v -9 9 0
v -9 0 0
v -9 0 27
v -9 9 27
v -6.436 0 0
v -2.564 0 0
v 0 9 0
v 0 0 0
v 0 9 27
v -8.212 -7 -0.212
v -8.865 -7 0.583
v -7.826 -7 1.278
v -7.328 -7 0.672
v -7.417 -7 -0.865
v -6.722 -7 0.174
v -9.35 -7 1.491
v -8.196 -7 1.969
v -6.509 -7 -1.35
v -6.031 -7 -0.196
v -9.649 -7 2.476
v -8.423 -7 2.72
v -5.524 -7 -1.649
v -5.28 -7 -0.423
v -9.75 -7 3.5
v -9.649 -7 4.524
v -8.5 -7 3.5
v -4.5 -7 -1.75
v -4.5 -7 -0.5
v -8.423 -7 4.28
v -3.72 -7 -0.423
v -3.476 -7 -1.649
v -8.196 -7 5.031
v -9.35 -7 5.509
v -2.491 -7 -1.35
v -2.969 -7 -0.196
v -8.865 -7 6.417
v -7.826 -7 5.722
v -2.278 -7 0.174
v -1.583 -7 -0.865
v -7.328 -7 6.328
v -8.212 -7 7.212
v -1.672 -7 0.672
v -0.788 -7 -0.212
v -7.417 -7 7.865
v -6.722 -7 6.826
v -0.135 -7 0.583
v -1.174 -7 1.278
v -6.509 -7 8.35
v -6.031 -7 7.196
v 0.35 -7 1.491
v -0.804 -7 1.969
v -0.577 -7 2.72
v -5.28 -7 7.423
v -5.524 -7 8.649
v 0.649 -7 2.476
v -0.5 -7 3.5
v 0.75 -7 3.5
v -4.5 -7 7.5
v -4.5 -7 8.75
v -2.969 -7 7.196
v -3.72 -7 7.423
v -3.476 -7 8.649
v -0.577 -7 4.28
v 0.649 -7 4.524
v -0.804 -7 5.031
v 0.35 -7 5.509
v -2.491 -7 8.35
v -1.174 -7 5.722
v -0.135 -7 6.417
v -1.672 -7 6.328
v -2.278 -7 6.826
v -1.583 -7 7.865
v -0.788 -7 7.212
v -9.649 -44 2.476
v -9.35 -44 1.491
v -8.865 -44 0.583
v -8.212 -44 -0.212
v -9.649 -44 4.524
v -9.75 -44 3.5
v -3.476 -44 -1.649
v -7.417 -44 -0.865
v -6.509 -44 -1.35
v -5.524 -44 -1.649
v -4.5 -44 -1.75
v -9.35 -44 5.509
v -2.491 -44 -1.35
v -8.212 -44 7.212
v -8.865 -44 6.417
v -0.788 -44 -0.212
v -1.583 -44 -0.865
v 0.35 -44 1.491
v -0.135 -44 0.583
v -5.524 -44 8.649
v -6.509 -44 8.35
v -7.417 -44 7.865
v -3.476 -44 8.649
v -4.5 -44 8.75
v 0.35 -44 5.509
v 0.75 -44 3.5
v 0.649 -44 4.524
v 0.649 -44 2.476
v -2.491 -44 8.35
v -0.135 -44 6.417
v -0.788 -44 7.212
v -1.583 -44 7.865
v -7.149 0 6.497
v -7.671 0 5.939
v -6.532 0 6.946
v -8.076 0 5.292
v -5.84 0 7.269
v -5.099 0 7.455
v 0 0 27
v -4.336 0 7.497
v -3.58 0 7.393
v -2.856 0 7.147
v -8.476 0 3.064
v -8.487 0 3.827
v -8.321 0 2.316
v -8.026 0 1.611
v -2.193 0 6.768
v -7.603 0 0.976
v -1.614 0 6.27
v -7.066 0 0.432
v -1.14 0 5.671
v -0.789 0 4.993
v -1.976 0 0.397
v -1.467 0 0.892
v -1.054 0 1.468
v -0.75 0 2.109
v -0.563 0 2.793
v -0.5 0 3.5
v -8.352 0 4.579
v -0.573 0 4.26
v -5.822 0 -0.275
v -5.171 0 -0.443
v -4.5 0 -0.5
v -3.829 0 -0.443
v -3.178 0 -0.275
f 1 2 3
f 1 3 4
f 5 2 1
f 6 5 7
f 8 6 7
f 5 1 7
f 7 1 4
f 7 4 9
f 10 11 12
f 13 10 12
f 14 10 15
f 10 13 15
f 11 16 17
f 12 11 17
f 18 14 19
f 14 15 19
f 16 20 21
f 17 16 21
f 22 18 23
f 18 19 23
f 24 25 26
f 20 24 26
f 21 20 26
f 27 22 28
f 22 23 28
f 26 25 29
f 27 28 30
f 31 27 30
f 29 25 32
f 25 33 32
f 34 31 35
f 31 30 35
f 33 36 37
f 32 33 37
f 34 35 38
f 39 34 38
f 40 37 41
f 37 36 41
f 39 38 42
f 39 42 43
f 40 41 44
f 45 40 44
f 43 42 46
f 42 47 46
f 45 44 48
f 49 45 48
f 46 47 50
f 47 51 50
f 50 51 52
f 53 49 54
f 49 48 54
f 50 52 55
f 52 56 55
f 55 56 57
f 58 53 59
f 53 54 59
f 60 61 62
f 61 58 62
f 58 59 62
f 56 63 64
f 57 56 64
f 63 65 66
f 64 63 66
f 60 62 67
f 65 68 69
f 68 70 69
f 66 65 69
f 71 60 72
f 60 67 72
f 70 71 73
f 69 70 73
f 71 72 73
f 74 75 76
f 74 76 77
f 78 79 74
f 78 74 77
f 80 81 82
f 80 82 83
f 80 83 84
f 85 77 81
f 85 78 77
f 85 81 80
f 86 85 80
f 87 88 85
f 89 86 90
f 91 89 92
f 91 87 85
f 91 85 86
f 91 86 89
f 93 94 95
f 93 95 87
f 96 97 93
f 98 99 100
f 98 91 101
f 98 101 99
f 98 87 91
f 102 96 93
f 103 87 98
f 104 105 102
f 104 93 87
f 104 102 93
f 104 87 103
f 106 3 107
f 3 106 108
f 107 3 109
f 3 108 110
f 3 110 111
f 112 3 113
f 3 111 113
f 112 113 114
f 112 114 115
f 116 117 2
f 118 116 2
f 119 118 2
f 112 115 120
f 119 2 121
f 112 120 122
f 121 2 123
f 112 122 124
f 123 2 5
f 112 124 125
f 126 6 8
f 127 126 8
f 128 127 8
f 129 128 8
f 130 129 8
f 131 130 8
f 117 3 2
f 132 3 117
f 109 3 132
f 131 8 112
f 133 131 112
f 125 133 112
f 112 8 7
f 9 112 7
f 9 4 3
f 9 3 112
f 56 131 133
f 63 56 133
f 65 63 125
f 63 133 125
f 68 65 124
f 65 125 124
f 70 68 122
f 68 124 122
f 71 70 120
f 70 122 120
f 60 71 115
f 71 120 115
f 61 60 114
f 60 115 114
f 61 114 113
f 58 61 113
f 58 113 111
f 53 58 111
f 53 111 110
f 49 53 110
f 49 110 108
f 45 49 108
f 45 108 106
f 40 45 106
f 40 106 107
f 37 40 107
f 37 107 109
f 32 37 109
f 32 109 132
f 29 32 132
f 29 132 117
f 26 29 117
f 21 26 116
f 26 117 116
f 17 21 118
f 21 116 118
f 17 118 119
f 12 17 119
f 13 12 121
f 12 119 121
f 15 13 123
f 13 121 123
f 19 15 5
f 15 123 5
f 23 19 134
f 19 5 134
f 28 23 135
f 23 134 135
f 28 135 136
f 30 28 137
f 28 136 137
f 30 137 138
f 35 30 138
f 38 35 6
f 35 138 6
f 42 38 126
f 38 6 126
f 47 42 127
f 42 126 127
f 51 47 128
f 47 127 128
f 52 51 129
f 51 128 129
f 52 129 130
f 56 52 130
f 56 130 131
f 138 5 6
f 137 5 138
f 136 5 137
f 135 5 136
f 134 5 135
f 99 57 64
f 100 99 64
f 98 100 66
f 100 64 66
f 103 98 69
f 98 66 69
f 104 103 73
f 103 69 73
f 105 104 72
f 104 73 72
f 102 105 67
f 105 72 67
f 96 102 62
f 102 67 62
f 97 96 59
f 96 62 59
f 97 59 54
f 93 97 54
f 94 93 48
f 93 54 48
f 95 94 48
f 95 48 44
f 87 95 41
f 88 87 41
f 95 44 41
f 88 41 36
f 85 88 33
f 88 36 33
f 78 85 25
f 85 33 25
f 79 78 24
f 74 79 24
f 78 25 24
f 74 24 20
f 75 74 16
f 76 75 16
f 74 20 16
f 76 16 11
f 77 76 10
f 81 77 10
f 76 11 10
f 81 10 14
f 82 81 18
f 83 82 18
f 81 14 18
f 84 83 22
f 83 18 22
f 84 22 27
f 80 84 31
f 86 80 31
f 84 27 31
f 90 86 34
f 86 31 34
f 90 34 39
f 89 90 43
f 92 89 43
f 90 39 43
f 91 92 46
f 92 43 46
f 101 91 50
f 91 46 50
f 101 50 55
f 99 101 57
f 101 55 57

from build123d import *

# Parameters (mm, degrees)
SKETCH_1_W      = 9
SKETCH_1_H      = 9
EXTRUDE_1_DEPTH = 27
SKETCH_2_R      = 4
EXTRUDE_2_DEPTH = 7
SKETCH_3_R      = 5.25
EXTRUDE_3_DEPTH = 37


with BuildPart() as part:
    # 草图1 → 凸台-拉伸1 (new body)
    with BuildSketch(Plane.XY):
        with Locations((-4.5, 4.5)):
            Rectangle(SKETCH_1_W, SKETCH_1_H)
    extrude(amount=EXTRUDE_1_DEPTH)

    # 草图2 → 凸台-拉伸2 (add)
    with BuildSketch(Plane.XZ):
        with Locations((-4.5, 3.5)):
            Circle(SKETCH_2_R)
    extrude(amount=EXTRUDE_2_DEPTH)

    # 草图3 → 凸台-拉伸3 (add)
    with BuildSketch(Plane.XZ.offset(7)):
        with Locations((-4.5, 3.5)):
            Circle(SKETCH_3_R)
    extrude(amount=EXTRUDE_3_DEPTH)


solid = part.part
